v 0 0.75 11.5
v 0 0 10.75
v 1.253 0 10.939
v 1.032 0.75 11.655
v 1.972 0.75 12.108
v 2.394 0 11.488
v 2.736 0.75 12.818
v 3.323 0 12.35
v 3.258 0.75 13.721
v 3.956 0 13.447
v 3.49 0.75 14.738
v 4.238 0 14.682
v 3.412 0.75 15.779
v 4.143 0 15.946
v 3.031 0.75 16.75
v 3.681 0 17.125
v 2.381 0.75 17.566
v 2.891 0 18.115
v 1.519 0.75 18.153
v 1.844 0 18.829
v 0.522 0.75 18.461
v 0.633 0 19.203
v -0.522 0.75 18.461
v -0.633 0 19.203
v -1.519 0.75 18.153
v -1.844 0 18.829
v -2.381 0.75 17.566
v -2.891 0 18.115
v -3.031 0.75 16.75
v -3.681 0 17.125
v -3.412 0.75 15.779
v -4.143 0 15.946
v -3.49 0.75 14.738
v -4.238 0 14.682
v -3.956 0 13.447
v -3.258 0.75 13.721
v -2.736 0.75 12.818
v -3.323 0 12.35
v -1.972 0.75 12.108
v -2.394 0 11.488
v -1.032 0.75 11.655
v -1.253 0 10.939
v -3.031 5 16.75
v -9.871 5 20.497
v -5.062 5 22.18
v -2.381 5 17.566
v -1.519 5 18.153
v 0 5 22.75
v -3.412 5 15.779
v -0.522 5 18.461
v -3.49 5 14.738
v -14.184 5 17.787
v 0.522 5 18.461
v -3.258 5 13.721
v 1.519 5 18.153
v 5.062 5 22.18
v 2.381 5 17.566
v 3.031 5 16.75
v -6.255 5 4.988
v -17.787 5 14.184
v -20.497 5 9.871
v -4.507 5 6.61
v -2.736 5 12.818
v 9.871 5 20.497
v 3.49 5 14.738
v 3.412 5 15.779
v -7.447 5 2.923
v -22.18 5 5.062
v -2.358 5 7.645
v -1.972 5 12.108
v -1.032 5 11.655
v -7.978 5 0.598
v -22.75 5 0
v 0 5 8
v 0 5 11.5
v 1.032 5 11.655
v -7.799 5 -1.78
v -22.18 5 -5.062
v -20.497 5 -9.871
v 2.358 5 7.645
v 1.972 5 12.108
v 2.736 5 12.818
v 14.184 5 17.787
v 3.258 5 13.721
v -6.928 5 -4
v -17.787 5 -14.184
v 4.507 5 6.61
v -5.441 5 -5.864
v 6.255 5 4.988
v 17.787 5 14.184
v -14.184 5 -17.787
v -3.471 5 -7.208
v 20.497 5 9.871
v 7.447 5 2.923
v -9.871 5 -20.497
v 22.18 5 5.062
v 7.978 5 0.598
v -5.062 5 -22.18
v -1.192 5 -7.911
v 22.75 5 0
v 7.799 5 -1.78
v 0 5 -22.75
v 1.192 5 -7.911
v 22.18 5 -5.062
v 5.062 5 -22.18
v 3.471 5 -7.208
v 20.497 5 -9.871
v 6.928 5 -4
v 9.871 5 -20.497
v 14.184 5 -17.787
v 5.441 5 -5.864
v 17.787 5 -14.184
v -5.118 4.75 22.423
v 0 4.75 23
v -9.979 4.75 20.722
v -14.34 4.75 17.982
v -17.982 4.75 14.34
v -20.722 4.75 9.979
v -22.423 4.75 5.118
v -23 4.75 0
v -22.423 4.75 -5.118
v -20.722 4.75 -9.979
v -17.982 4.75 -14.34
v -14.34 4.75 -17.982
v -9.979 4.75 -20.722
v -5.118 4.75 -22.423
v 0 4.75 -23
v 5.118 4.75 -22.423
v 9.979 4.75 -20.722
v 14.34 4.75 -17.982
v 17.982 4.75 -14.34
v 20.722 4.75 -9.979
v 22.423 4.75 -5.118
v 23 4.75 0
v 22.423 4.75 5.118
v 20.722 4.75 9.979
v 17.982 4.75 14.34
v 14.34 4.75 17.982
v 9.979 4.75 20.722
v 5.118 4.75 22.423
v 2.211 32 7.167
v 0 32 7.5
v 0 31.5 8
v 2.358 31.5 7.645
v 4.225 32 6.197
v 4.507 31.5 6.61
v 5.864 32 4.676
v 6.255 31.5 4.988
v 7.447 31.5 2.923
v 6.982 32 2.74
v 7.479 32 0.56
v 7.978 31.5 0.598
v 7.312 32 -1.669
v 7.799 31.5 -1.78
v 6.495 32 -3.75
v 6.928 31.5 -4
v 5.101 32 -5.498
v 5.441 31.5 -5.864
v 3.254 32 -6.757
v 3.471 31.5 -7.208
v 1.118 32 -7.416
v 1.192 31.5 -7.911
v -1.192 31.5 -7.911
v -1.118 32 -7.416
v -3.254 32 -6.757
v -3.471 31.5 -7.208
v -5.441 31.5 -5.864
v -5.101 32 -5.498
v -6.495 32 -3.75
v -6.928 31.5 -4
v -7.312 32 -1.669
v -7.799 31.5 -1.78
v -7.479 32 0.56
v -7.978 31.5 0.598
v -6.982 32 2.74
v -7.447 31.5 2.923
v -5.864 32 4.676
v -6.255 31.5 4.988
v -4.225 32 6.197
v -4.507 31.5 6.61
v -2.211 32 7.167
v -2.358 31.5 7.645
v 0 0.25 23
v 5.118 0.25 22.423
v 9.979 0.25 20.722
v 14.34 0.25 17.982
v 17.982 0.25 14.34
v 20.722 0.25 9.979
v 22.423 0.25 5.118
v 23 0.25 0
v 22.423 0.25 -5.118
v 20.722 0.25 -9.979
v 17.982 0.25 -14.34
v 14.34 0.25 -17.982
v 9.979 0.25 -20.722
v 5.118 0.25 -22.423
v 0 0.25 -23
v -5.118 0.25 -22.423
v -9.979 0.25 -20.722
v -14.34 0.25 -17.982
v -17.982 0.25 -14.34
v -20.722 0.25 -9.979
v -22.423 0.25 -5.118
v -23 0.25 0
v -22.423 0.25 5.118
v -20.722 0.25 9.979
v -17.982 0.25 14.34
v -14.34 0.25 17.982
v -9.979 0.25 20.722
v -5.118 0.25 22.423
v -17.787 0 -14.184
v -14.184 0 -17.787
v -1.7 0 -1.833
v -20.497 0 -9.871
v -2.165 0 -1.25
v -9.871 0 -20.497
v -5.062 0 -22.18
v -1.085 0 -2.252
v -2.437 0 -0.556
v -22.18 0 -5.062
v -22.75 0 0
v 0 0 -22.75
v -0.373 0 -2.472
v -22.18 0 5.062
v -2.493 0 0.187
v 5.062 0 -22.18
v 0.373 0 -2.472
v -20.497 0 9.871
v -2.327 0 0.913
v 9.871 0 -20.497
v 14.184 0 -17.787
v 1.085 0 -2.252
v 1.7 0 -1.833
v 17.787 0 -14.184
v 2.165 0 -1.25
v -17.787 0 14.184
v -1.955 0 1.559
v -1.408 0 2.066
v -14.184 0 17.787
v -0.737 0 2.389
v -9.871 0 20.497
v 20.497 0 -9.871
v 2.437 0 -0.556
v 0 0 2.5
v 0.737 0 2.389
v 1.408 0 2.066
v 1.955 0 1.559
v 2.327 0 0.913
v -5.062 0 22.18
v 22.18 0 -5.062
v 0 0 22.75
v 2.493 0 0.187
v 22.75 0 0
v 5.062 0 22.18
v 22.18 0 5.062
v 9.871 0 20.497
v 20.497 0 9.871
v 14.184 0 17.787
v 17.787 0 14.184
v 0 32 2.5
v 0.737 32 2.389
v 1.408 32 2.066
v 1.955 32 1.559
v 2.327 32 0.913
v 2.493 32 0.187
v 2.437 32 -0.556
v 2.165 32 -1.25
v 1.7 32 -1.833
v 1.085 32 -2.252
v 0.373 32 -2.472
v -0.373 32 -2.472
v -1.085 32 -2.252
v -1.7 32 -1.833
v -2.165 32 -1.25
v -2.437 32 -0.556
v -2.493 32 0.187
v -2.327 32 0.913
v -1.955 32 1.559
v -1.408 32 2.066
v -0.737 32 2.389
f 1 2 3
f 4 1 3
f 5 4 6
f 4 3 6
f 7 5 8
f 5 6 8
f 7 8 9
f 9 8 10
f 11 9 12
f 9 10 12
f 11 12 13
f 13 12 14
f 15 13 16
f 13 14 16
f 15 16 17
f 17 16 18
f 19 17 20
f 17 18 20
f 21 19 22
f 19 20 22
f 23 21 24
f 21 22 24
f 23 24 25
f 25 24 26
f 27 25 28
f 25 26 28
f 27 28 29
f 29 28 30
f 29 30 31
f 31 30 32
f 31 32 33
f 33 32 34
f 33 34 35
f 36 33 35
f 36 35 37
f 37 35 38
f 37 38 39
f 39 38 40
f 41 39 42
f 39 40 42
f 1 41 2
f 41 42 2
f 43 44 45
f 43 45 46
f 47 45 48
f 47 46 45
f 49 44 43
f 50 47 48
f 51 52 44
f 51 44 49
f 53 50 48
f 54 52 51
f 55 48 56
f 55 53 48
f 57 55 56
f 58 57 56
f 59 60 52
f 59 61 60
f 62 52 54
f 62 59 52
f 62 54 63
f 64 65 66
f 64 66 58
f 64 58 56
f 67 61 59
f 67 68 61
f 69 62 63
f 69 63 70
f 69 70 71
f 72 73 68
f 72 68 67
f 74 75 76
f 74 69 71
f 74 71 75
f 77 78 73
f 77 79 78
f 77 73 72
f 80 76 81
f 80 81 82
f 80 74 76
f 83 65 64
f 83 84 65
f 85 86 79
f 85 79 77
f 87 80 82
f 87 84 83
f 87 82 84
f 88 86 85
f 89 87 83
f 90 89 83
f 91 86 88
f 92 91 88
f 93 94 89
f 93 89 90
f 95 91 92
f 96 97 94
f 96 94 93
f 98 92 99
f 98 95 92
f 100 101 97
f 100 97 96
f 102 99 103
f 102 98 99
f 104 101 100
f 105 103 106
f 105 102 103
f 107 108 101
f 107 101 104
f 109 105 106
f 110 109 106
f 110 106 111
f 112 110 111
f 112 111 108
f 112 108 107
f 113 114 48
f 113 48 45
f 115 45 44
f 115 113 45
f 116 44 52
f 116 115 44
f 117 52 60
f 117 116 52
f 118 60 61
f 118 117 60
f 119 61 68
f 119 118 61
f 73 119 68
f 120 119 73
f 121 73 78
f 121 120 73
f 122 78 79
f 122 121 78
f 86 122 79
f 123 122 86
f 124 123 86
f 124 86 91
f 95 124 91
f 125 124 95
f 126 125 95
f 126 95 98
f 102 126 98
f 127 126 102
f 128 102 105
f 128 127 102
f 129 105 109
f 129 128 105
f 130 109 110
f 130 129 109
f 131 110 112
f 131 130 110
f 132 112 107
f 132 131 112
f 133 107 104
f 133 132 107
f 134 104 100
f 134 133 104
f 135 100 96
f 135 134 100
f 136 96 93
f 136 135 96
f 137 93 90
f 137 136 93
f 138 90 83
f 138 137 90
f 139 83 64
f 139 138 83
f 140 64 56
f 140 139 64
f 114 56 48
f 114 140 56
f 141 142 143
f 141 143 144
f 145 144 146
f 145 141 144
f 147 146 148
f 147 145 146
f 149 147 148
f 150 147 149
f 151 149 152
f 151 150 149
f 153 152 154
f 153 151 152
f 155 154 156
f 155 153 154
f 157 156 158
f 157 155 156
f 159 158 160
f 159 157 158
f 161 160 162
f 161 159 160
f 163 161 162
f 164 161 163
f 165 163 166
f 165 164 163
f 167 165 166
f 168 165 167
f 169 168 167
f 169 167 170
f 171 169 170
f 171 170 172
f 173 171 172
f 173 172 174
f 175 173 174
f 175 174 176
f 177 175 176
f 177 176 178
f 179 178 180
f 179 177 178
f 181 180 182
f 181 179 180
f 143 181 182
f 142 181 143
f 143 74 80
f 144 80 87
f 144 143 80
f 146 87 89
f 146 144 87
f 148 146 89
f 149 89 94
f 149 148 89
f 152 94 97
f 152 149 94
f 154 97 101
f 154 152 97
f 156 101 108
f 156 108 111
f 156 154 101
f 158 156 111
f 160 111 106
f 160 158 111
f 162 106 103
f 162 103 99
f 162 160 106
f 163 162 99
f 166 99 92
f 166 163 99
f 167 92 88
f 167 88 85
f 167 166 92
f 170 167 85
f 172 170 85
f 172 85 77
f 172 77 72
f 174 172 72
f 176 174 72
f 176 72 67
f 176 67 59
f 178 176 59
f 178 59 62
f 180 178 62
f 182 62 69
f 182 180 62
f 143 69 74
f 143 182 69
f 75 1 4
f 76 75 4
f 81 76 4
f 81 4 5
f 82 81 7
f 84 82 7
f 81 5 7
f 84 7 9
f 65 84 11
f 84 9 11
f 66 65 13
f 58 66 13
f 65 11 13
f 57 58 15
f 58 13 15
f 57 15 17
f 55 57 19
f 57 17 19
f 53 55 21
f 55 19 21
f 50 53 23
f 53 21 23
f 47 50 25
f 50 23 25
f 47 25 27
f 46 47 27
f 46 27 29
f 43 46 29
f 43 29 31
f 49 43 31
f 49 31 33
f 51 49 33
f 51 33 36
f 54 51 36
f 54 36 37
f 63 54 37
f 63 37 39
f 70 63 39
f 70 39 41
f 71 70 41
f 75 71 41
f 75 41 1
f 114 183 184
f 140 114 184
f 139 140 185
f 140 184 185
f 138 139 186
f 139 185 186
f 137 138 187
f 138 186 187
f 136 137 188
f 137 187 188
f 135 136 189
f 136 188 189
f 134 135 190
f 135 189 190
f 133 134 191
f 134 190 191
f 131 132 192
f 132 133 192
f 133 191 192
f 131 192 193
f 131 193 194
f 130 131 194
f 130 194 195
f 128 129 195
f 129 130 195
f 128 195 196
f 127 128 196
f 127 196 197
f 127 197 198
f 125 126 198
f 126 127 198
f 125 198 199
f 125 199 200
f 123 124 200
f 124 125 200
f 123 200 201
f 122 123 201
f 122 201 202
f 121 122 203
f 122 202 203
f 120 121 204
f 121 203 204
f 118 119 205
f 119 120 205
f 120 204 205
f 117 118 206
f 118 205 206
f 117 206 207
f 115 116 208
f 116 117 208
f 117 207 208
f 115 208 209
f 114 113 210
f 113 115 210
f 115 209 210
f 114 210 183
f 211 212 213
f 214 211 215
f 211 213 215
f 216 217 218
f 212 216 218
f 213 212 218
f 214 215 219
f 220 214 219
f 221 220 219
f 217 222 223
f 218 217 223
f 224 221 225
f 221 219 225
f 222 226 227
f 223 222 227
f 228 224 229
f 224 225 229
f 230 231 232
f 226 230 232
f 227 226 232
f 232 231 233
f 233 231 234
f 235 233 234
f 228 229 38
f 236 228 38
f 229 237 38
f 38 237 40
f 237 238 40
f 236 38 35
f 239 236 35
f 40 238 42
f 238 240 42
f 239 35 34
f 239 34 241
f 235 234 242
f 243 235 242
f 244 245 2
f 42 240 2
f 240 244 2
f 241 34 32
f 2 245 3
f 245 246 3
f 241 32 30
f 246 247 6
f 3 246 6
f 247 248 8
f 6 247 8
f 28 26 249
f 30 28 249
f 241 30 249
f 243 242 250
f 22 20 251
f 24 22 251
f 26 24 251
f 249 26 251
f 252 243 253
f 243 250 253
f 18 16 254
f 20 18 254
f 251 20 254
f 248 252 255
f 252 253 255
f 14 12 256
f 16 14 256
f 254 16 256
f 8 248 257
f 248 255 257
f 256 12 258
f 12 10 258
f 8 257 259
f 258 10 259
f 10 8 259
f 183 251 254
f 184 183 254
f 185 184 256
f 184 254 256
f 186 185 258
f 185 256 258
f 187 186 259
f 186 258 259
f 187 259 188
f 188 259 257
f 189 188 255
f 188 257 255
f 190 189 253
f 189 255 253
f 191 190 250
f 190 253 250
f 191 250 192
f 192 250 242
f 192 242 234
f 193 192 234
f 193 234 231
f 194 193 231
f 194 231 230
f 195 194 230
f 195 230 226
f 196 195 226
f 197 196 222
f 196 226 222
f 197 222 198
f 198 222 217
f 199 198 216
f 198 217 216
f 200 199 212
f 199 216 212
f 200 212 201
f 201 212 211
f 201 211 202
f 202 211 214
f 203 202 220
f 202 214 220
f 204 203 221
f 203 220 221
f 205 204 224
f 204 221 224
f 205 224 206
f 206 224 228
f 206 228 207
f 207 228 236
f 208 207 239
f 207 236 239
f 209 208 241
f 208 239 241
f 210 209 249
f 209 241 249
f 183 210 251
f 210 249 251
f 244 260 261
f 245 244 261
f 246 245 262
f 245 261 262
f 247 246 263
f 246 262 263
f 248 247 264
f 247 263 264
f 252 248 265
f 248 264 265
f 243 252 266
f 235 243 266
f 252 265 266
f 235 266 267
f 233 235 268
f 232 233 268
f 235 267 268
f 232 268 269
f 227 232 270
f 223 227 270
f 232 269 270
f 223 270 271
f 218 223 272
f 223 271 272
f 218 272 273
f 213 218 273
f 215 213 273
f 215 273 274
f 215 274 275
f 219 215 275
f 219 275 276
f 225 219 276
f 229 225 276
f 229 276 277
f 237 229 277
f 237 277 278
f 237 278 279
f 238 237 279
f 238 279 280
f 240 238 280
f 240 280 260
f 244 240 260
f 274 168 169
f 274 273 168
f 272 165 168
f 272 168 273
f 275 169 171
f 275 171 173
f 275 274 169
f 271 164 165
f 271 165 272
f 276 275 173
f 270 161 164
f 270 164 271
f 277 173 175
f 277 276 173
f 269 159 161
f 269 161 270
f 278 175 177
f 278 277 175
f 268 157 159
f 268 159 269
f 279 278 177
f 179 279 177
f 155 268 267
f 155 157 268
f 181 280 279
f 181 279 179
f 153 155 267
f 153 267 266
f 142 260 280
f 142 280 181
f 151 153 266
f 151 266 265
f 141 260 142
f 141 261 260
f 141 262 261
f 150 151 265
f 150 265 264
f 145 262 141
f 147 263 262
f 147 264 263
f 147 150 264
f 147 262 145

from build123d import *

# Parameters (mm, degrees)
SKETCH1_R           = 23
BOSS_EXTRUDE1_DEPTH = 32
SKETCH2_OUTSIDE_W   = 62.5
SKETCH2_OUTSIDE_H   = 62.5
SKETCH2_OUTSIDE_R   = 8
CUT_EXTRUDE1_DEPTH  = 27
SKETCH3_R           = 2.5
CUT_EXTRUDE2_DEPTH  = 46.628938186
CHAMFER1_SIZE       = 0.5
CHAMFER2_SIZE       = 0.25
SKETCH4_R           = 3.5
CUT_EXTRUDE3_DEPTH  = 46.628938186
CHAMFER3_SIZE       = 0.75


with BuildPart() as part:
    # Sketch1 → Boss-Extrude1 (new body)
    with BuildSketch(Plane(origin=(0, 0, 0), x_dir=(1, 0, 0), z_dir=(0, 1, 0))):
        with Locations(Location((0, 0, 0), (0, 0, 270))):
            Circle(SKETCH1_R)
    extrude(amount=BOSS_EXTRUDE1_DEPTH)

    # Sketch2 outside → Cut-Extrude1 (cut)
    with BuildSketch(Plane(origin=(0, 32, 0), x_dir=(1, 0, 0), z_dir=(0, 1, 0))):
        Rectangle(SKETCH2_OUTSIDE_W, SKETCH2_OUTSIDE_H)
        with Locations(Location((0, 0, 0), (0, 0, 270))):
            Circle(SKETCH2_OUTSIDE_R, mode=Mode.SUBTRACT)
    extrude(amount=-CUT_EXTRUDE1_DEPTH, mode=Mode.SUBTRACT)

    # Sketch3 → Cut-Extrude2 (cut, through all)
    with BuildSketch(Plane(origin=(0, 32, 0), x_dir=(1, 0, 0), z_dir=(0, 1, 0))):
        with Locations(Location((0, 0, 0), (0, 0, 270))):
            Circle(SKETCH3_R)
    extrude(amount=-CUT_EXTRUDE2_DEPTH, mode=Mode.SUBTRACT)

    # Chamfer1
    chamfer1_edges = [part.edges().sort_by_distance(p)[0] for p in [
        (0, 32, -8),
    ]]
    chamfer(chamfer1_edges, length=CHAMFER1_SIZE)

    # Chamfer2
    chamfer2_edges = [part.edges().sort_by_distance(p)[0] for p in [
        (0, 0, -23),
        (0, 5, -23),
    ]]
    chamfer(chamfer2_edges, length=CHAMFER2_SIZE)

    # Sketch4 → Cut-Extrude3 (cut, through all)
    with BuildSketch(Plane.XZ):
        with Locations(Location((0, 15, 0), (0, 0, 270))):
            Circle(SKETCH4_R)
    extrude(amount=-CUT_EXTRUDE3_DEPTH, mode=Mode.SUBTRACT)

    # Chamfer3
    chamfer3_edges = [part.edges().sort_by_distance(p)[0] for p in [
        (0, 0, 18.5),
    ]]
    chamfer(chamfer3_edges, length=CHAMFER3_SIZE)


solid = part.part
